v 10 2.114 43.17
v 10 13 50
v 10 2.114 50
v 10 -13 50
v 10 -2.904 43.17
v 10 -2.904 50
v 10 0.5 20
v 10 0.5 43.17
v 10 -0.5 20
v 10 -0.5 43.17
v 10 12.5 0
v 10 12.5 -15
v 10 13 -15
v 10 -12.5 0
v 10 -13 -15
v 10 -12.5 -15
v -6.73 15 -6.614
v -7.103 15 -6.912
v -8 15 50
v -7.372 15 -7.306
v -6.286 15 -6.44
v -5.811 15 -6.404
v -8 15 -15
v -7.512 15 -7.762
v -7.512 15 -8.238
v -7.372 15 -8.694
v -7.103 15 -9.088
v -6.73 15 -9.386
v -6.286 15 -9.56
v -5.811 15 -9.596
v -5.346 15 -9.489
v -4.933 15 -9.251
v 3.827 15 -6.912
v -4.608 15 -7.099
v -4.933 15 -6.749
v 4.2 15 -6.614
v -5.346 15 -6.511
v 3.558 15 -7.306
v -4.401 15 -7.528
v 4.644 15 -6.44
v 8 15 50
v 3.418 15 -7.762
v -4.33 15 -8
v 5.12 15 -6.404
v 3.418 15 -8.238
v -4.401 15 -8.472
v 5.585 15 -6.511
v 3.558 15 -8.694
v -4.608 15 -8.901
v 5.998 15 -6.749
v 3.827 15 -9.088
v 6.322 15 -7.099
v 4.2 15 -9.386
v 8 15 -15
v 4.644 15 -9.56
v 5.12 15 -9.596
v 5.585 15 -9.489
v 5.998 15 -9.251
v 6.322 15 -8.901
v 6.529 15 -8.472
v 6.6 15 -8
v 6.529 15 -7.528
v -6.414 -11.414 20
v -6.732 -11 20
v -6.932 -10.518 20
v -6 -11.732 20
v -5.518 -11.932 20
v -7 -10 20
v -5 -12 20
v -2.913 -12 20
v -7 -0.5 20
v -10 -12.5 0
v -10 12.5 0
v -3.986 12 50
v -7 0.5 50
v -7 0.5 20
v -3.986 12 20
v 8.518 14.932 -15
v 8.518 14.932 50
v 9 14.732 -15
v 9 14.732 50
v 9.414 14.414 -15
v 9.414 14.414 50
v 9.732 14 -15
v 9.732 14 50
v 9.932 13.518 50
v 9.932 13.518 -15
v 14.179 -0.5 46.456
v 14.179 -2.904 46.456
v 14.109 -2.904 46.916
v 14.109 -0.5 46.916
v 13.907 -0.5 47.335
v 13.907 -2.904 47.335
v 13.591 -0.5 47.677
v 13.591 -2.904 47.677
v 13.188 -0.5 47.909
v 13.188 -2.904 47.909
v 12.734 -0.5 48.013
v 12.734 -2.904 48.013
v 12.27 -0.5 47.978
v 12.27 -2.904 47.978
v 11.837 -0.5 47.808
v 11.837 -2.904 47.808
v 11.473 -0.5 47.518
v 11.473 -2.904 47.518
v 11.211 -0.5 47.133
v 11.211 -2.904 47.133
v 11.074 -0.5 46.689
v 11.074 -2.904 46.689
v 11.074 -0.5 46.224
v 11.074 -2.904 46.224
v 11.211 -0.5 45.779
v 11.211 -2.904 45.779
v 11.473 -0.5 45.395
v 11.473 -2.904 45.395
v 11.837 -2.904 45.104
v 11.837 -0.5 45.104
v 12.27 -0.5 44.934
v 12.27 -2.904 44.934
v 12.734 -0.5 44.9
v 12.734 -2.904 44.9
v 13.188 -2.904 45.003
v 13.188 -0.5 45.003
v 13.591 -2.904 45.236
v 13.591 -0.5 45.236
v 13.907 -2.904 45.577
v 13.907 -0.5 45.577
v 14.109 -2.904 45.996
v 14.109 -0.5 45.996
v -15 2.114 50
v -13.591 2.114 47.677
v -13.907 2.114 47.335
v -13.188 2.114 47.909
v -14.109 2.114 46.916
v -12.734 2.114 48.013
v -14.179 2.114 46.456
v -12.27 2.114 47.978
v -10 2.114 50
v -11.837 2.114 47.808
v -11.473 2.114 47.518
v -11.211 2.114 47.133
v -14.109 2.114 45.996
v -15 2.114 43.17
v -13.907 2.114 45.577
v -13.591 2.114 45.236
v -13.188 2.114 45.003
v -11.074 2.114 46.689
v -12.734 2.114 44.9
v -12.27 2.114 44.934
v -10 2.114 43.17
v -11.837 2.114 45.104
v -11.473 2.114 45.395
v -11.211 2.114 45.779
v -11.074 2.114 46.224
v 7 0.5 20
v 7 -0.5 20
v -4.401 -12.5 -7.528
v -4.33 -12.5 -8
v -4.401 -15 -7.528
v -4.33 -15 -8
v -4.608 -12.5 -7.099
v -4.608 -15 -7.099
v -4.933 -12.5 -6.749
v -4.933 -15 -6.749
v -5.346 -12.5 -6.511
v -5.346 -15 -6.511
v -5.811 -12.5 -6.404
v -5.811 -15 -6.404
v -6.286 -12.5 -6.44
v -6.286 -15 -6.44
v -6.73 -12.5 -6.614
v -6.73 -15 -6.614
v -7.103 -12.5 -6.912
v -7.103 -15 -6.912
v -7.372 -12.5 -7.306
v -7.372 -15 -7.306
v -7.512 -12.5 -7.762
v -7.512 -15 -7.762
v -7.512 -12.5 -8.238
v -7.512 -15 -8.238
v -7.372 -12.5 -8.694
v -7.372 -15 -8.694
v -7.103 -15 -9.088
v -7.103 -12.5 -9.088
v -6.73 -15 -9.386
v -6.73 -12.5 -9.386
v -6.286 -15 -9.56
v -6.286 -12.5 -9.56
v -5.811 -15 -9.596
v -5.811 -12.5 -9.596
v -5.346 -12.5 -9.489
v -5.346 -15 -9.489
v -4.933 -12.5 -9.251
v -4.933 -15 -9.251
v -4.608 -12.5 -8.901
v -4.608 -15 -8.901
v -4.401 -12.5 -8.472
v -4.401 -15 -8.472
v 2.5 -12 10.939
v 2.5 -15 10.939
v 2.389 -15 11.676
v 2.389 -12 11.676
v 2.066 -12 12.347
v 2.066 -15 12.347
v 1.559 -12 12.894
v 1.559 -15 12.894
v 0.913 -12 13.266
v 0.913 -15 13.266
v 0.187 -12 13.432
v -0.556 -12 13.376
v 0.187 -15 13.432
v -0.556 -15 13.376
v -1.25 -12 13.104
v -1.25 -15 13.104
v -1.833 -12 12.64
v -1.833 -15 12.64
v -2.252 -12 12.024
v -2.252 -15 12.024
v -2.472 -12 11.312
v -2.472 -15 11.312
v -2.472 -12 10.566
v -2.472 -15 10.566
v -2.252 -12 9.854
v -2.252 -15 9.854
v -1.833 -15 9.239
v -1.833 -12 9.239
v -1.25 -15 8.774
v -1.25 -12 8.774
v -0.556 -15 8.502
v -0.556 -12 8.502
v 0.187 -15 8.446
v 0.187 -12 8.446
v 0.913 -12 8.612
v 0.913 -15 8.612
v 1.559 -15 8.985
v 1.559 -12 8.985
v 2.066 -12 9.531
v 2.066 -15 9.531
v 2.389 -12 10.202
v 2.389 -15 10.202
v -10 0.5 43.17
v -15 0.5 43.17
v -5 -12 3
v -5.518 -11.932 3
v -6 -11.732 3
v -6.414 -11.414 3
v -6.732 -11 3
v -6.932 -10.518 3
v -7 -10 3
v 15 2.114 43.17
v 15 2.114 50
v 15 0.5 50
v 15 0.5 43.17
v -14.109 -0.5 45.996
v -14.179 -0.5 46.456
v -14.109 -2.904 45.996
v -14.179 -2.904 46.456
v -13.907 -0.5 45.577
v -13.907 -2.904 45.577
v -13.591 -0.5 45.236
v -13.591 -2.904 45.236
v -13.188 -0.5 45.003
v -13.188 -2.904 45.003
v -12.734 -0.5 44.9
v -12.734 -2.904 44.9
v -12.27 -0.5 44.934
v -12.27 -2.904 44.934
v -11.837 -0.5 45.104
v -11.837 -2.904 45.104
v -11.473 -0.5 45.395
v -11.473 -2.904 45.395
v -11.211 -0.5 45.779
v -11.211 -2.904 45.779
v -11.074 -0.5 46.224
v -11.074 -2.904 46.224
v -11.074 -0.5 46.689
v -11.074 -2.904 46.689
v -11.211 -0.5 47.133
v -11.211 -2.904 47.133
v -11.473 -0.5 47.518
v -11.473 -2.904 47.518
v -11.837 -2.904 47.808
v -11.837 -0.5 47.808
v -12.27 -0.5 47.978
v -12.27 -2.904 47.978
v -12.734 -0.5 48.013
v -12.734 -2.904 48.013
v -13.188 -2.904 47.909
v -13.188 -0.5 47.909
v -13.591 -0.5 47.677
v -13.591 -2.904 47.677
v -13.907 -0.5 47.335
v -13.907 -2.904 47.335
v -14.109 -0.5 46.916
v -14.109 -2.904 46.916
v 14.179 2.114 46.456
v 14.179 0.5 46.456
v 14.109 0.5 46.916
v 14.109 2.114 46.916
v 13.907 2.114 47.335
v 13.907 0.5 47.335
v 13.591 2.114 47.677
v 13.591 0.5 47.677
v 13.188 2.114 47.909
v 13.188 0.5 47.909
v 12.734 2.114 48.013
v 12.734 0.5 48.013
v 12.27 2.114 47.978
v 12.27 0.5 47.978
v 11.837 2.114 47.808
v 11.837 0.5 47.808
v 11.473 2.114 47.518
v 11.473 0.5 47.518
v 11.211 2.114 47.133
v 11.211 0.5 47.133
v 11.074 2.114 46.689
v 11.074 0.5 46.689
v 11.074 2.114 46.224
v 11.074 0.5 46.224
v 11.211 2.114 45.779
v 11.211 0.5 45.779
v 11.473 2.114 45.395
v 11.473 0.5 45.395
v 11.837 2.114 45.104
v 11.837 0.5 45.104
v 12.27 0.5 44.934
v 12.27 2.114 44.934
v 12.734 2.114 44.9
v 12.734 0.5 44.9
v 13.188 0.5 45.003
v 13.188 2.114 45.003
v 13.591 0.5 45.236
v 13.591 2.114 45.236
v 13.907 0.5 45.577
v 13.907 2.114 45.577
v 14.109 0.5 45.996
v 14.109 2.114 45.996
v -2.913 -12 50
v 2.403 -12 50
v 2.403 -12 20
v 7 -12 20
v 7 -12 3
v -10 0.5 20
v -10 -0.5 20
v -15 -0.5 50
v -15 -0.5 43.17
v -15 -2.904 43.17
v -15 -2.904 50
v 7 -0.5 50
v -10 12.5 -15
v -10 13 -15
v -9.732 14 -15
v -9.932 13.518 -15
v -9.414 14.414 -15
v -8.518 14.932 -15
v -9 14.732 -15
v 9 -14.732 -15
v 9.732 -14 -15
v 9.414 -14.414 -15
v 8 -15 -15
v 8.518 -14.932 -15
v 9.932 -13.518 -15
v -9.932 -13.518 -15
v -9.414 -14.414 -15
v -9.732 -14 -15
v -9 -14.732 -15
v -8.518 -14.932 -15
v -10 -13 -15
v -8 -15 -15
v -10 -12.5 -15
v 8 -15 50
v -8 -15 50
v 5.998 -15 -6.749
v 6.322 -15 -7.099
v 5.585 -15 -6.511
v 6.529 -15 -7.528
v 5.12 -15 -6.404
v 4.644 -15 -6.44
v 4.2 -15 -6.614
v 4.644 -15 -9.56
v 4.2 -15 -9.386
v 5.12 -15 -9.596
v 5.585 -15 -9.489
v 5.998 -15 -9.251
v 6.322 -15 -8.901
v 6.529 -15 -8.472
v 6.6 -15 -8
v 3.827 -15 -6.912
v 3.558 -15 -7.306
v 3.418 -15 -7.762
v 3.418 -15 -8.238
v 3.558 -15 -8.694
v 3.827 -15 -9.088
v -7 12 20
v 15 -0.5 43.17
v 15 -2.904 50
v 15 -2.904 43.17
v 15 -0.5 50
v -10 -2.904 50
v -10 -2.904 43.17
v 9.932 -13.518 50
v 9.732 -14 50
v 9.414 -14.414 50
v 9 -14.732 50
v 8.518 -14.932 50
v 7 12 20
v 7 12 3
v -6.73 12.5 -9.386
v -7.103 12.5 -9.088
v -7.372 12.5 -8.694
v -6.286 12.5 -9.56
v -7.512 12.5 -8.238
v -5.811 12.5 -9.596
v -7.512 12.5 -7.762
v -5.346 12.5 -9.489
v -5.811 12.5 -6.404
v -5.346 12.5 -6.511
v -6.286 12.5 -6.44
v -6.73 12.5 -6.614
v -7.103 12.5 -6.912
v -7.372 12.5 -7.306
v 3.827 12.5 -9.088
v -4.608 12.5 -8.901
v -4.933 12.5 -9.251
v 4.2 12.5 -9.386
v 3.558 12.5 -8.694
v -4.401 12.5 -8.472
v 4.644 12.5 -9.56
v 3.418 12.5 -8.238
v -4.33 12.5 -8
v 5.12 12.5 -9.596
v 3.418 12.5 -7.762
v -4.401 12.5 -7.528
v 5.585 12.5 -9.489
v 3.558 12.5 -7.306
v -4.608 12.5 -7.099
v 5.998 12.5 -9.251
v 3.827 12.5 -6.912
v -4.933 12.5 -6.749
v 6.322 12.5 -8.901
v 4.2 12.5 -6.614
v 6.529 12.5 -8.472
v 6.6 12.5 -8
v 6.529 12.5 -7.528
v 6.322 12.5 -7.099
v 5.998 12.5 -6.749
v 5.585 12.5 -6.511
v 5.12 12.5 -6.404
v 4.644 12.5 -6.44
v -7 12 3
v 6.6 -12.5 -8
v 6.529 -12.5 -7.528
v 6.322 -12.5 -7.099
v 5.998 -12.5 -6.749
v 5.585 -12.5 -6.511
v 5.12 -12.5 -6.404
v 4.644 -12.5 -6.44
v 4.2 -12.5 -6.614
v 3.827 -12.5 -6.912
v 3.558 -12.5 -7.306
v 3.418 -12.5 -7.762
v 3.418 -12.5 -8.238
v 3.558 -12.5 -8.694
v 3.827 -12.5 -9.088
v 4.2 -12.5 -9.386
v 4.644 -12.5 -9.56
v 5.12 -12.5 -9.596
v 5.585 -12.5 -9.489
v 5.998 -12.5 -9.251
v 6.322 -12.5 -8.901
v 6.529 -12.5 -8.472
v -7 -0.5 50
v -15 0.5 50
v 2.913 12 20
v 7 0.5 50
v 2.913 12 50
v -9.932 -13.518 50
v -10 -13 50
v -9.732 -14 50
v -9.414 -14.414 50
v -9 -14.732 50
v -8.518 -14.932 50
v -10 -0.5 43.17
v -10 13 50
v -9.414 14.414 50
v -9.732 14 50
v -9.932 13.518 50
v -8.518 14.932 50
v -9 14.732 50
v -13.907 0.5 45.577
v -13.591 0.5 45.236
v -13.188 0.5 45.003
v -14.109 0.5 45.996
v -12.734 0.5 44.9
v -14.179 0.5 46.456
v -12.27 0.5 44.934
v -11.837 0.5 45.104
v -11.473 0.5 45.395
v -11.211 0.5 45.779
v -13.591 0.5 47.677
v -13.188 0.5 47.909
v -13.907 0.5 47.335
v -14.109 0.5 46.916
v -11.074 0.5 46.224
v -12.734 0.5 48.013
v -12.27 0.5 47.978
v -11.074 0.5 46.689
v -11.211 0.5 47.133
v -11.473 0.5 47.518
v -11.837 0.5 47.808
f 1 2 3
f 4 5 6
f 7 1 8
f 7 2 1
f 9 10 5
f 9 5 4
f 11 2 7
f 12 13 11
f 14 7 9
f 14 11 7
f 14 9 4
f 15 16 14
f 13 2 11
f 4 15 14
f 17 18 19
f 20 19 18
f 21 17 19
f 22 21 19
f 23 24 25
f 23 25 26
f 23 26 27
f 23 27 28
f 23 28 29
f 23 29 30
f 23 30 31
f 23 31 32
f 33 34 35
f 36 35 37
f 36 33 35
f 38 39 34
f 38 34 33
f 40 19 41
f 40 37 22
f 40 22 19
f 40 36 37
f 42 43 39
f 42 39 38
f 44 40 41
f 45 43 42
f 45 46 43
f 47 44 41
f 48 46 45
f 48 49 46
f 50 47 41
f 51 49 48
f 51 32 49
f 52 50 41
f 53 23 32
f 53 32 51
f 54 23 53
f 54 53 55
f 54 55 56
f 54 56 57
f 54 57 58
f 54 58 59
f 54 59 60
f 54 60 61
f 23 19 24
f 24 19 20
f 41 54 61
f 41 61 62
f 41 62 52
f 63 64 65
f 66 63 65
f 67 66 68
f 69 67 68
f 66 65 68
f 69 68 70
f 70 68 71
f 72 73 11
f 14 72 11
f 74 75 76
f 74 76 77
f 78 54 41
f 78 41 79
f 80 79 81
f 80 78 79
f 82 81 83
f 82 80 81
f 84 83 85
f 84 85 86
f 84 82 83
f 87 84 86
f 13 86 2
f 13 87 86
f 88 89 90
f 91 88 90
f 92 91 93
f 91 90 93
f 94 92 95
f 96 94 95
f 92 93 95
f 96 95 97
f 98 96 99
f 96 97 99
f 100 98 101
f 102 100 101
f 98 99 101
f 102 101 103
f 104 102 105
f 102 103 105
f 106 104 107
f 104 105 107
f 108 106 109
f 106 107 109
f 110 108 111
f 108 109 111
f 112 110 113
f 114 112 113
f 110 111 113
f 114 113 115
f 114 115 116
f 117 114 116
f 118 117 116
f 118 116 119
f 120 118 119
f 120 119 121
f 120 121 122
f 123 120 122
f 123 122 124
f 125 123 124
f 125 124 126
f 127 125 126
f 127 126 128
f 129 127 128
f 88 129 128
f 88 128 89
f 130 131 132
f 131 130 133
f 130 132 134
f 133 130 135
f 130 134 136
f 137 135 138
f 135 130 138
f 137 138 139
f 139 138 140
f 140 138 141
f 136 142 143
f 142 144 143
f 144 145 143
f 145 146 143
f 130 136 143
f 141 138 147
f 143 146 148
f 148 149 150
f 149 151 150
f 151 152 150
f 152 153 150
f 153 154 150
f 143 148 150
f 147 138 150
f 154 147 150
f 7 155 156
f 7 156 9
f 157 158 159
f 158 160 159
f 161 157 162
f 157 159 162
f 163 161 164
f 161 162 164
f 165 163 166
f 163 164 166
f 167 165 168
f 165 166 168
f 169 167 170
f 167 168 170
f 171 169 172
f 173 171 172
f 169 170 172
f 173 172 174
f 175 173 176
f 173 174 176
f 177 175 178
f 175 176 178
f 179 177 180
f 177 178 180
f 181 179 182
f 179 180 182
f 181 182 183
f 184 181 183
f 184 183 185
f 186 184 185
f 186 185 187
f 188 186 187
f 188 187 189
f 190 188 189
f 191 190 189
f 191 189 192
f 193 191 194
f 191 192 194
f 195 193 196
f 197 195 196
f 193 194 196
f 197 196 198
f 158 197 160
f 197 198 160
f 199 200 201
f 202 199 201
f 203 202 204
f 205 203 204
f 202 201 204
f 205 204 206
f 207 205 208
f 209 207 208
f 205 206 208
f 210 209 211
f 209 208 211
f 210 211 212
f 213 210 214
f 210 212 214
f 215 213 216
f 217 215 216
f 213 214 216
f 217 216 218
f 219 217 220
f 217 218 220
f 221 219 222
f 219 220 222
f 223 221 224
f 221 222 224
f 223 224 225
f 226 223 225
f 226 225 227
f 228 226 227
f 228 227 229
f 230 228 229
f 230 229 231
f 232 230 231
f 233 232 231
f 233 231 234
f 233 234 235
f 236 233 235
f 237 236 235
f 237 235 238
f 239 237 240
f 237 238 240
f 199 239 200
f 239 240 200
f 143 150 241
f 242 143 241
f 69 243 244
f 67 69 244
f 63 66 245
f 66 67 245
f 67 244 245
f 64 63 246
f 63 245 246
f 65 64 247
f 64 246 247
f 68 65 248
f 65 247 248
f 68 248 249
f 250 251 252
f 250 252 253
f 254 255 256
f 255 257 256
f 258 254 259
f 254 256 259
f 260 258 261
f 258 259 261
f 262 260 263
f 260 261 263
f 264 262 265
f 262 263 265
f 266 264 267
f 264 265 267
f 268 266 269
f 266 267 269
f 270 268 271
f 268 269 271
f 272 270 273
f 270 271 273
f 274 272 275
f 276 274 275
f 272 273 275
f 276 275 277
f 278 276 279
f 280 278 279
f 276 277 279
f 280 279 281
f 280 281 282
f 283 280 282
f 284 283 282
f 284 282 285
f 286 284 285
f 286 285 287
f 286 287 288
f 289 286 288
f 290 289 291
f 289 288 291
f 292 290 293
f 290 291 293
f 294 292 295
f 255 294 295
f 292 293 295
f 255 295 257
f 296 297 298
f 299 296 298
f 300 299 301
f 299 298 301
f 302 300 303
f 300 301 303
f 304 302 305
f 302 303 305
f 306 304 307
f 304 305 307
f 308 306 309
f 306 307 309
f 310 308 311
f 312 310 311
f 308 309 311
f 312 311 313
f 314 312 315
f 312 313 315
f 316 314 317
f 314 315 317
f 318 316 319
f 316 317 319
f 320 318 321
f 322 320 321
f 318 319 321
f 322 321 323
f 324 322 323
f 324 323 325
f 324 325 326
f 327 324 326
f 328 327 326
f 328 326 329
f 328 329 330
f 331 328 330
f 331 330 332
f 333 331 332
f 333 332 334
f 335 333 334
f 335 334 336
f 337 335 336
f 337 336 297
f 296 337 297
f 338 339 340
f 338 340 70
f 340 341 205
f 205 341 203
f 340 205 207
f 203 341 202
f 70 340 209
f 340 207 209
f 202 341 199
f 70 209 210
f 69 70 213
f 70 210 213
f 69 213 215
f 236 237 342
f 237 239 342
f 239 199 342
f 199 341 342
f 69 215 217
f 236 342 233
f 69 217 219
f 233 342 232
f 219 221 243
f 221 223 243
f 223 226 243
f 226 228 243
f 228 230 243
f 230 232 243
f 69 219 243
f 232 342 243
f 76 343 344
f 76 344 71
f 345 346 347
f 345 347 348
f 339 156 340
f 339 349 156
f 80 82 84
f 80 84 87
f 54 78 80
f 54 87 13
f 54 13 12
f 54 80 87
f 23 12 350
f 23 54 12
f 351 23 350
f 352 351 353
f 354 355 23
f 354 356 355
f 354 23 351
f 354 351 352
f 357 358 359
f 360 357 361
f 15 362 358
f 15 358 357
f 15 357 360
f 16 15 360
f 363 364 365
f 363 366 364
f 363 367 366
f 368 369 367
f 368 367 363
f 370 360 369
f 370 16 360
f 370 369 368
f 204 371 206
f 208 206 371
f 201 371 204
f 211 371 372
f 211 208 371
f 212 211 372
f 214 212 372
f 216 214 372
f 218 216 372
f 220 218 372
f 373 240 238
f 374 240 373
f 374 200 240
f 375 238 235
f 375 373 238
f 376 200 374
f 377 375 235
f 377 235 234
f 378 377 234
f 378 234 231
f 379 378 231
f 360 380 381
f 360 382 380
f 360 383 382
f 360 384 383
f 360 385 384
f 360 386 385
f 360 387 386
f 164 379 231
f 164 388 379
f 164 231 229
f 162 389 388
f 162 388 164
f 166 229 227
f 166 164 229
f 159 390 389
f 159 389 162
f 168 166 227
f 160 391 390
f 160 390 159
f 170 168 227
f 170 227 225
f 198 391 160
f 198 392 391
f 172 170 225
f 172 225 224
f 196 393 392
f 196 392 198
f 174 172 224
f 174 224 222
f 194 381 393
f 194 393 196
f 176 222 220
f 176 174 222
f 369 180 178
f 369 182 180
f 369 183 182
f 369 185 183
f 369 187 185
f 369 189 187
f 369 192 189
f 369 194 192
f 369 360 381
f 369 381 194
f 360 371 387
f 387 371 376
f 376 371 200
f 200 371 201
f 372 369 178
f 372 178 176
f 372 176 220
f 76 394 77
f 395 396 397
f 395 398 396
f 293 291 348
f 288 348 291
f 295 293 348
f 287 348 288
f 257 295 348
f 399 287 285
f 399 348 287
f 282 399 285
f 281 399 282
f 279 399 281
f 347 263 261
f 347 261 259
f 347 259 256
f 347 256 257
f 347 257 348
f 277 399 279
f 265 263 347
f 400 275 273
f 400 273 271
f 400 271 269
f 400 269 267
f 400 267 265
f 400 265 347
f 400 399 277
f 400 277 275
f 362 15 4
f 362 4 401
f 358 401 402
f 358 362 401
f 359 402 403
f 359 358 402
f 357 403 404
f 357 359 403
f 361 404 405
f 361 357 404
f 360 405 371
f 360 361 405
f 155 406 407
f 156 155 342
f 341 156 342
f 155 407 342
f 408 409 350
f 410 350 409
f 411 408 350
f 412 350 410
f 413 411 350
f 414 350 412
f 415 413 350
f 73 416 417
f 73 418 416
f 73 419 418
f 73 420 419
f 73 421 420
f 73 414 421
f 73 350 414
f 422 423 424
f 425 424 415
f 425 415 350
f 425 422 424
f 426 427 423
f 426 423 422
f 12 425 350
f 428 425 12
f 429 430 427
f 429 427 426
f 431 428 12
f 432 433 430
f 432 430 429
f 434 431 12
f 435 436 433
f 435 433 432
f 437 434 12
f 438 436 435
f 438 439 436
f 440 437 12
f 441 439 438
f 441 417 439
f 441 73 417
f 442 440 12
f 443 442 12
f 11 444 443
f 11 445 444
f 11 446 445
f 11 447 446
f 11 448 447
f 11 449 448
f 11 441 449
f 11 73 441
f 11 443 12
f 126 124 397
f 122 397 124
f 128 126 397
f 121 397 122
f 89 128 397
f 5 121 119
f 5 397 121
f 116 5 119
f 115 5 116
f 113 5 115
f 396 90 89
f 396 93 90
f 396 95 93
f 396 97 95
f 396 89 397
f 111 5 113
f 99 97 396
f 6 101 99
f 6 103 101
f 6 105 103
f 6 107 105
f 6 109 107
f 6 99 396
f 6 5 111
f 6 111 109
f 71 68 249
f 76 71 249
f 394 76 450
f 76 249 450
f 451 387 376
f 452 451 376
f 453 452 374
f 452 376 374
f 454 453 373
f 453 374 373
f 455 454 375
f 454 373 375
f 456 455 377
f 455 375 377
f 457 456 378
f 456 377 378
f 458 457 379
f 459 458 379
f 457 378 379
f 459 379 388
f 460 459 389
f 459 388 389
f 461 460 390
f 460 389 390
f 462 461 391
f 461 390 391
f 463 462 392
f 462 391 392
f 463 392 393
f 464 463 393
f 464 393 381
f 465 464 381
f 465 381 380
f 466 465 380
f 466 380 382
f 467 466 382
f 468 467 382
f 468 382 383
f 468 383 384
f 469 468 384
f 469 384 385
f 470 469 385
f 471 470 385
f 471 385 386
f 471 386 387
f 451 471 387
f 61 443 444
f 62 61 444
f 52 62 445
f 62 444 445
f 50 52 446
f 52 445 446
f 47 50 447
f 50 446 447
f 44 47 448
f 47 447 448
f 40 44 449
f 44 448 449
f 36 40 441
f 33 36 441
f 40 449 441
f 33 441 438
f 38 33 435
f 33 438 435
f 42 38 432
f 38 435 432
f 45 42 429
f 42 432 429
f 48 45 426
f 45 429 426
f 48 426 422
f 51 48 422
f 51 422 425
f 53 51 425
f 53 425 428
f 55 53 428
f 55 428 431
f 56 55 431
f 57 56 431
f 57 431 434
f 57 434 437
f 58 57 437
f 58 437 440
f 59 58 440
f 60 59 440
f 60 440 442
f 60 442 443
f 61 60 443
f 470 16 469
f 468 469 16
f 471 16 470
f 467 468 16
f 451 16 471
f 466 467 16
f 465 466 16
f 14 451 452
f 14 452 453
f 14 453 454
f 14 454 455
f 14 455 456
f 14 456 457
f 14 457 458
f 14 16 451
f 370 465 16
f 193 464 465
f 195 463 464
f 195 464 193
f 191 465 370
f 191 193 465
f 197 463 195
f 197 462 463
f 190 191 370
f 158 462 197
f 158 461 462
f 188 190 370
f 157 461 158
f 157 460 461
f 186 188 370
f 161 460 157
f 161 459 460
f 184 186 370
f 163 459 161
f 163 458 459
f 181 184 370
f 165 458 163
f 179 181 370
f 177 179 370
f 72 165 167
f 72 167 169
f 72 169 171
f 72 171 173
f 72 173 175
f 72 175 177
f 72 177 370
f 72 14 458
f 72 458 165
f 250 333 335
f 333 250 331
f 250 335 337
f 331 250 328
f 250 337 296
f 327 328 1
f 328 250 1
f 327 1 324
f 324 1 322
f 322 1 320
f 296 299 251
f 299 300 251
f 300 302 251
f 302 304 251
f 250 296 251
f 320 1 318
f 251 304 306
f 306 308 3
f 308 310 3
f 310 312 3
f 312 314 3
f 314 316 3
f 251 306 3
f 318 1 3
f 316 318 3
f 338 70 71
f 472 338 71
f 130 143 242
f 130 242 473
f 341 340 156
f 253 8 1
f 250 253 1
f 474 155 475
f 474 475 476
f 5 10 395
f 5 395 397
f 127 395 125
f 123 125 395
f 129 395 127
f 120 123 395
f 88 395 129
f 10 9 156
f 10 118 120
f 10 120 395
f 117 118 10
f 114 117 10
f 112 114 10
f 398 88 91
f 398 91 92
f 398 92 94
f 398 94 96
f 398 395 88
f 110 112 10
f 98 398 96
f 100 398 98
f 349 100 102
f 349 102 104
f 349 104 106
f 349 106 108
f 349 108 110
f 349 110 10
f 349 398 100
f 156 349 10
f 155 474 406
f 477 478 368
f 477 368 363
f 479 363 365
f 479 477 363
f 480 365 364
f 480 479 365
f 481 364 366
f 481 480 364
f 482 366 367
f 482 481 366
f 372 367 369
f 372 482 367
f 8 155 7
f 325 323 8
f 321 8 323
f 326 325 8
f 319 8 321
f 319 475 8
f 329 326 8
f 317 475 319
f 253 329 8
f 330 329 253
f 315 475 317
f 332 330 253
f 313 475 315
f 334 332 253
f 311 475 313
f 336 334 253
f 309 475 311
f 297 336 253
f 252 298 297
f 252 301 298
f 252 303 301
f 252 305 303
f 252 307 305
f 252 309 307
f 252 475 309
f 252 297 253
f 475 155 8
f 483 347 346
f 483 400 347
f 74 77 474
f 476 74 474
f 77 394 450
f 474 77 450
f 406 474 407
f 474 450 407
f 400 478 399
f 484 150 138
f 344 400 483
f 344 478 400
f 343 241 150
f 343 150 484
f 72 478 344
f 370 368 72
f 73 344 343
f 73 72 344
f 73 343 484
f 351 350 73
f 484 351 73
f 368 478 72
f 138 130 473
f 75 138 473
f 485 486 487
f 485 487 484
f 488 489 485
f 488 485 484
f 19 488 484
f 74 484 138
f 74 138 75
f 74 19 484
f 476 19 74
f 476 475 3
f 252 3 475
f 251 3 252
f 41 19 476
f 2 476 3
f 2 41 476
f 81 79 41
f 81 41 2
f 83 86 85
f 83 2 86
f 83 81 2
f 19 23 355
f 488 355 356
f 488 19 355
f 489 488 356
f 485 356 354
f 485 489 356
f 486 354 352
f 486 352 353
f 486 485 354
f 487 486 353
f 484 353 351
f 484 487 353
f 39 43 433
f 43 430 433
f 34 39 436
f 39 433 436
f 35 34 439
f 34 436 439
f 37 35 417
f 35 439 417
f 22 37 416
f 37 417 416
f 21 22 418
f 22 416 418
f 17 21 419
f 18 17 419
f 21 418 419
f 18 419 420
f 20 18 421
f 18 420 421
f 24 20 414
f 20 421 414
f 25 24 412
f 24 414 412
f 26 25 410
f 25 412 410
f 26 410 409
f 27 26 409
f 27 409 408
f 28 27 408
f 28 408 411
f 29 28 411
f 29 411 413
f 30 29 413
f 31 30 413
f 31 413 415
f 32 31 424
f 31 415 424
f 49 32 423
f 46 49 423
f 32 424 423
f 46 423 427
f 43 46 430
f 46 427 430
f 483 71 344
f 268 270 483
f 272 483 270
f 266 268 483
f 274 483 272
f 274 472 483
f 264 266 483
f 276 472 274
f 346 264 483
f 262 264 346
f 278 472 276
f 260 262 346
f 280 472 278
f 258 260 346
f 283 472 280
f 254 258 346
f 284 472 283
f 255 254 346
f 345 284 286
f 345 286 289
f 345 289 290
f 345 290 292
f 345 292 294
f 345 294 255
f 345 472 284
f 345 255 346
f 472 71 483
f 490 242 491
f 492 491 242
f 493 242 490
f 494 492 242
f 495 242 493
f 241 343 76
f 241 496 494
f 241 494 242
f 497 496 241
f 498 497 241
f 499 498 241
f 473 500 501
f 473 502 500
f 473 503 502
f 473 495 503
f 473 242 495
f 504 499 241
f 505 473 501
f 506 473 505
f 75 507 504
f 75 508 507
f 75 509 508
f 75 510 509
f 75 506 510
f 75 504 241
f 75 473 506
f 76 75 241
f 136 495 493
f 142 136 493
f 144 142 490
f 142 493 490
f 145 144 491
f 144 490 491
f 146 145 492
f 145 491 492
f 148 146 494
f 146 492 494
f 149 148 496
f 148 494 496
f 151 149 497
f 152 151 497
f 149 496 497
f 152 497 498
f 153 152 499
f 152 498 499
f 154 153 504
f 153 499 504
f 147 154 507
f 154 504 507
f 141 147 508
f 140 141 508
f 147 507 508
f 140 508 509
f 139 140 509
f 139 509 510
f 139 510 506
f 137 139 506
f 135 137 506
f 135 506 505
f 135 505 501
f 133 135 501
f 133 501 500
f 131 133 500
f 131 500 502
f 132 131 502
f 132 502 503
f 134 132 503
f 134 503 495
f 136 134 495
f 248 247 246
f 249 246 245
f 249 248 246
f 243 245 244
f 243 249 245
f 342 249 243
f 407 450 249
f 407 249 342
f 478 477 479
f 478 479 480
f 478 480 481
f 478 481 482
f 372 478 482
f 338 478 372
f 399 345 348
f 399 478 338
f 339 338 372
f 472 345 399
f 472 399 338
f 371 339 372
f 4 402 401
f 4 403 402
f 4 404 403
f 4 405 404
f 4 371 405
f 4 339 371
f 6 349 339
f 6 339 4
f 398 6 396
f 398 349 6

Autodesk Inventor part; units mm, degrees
ref_plane "YZ Plane" through (0, 0, 0) normal (1, 0, 0) x (0, 1, 0)
ref_plane "XZ Plane" through (0, 0, 0) normal (0, 1, 0) x (-1, 0, 0)
ref_plane "XY Plane" through (0, 0, 0) normal (0, 0, 1) x (1, 0, 0)
sketch "Sketch1" plane through (0, 0, 0) normal (0, 0, 1) x (1, 0, 0)
  line L0 (-10, 15) -> (10, 15)
  line L1 (10, 15) -> (10, -15)
  line L2 (10, -15) -> (-10, -15)
  line L3 (-10, -15) -> (-10, 15)
  line L4 (-10, 15) -> (10, -15) construction
  line L5 (10, 15) -> (-10, -15) construction
  point P0 (0, 0)
  dimension "d0" = 20
  dimension "d1" = 30
extrude "Extrusion1" add sketch "Sketch1" along normal blind 50
shell "Shell1" thickness 3 removed faces 1 at (-3.3333, 5, 50)
sketch "Sketch2" plane through (-10, 15, 0) normal (0, 1, 0) x (1, 0, 0)
  line L0 (3, -3) -> (17, -3) projected
  line L1 (-7, -47) -> (17, -47)
  line L2 (17, -47) -> (17, -3)
  line L3 (17, -3) -> (-7, -3)
  line L4 (-7, -3) -> (-7, -47)
  line L5 (-7, -47) -> (17, -3) construction
  line L6 (17, -47) -> (-7, -3) construction
  point P0 (10, 0)
  point P1 (5, -25)
sketch "Sketch3" plane through (0, 0, 0) normal (0, 0, -1) x (-1, 0, 0)
  line L0 (-10, 15) -> (10, 15) projected
  line L1 (10, 15) -> (10, -15) projected
  line L2 (-10, 15) -> (10, 15)
  line L3 (10, 15) -> (10, 12.5)
  line L4 (10, 12.5) -> (-10, 12.5)
  line L5 (-10, 12.5) -> (-10, 15)
  line L6 (-10, -15) -> (-10, 15) projected
  line L7 (10, -15) -> (-10, -15)
  line L8 (-10, -15) -> (-10, -12.5)
  line L9 (-10, -12.5) -> (10, -12.5)
  line L10 (10, -12.5) -> (10, -15)
  point P0 (0, 0)
  point P1 (10, -12.5)
  dimension "d5" = 2.5
  dimension "d6" = 2.5
extrude "Extrusion2" add sketch "Sketch3" along normal blind 15 contours L0 L1 L4 L5 | L9 L1 L7 L6
sketch "Sketch4" plane through (-10, 15, 50) normal (0, 1, 0) x (1, 0, 0)
  point P0 (10, 50)
sketch "Sketch6" plane through (-10, -15, 50) normal (0, -1, 0) x (1, 0, 0)
  circle A0 centre (4.0698, -58) radius 1.6 projected
  circle A1 centre (15, -58) radius 1.6 projected
  point P0 (10, -50)
extrude "Extrusion4" cut sketch "Sketch6" against normal through all
fillet "Fillet1" radius 2 4 edges at (-7, -12, 26.5) (10, -15, 17.5) (-10, 15, 17.5) (10, 15, 17.5)
fillet "Fillet2" radius 2 1 edges at (-10, -15, 17.5)
sketch "Sketch7" plane through (8, -15, -15) normal (0, -1, 0) x (1, 0, 0)
  circle A0 centre (-8, 25.9391) radius 2.5
  point P0 (-8, 15)
  dimension "d17" = 5
extrude "Extrusion5" cut sketch "Sketch7" against normal blind 10
sketch "Sketch8" plane through (0, 0, 50) normal (0, 0, 1) x (1, 0, 0)
  line L0 (-10, 12.5) -> (-10, -12.5) projected
  line L1 (10, -0.5) -> (-10, -0.5)
  line L2 (-10, -0.5) -> (-10, 0.5)
  line L3 (-10, 0.5) -> (10, 0.5)
  line L4 (10, 0.5) -> (10, -0.5)
  line L5 (10, -0.5) -> (-10, 0.5) construction
  line L6 (-10, -0.5) -> (10, 0.5) construction
  point P0 (0, 0)
  dimension "d20" = 1
extrude "Extrusion6" cut sketch "Sketch8" against normal blind 30
sketch "Sketch9" plane through (0, 0, 50) normal (0, 0, 1) x (1, 0, 0)
  line L0 (-7, 0.5) -> (-3.9859, 12)
  line L1 (-7, 12) -> (7, 12) projected
  line L2 (-3.9859, 12) -> (2.913, 12)
  line L3 (7, 0.5) -> (2.913, 12)
  line L4 (7, -0.5) -> (2.3967, -12.0157)
  line L5 (2.3967, -12.0157) -> (-2.9074, -12.0157)
  line L6 (7, -12) -> (7, 12) projected
  line L7 (-7, -10) -> (-7, -0.5) projected
  line L8 (-2.9074, -12.0157) -> (-7, -0.5)
  line L9 (-7, -0.5) -> (7, -0.5)
  line L10 (10, -12.5) -> (10, 12.5) projected
  line L11 (7, 0.5) -> (-7, 0.5)
  line L12 (10, 12.5) -> (-10, 12.5) projected
  line L13 (7, -12) -> (-5, -12) projected
  arc A0 (-7, -10) -> (-5, -12) centre (-5, -10) ccw projected
  line L14 (-7, 0.5) -> (-7, 12) projected
  point P0 (0, 0)
  point P1 (2.403, -12)
  point P2 (-2.913, -12)
extrude "Extrusion7" add sketch "Sketch9" against normal blind 30 contours L14 L1 L0 | L3 L1 L6 | L6 L13 L4 | L8 L13 A0 L7
sketch "Sketch10" plane through (10, -12.5, 0) normal (1, 0, 0) x (0, 0, -1)
  line L0 (-20, 12) -> (-50, 12) projected
  line L1 (-50, 12) -> (-43.1699, 12)
  line L2 (-43.1699, 12) -> (-43.1699, 9.596)
  line L3 (-43.1699, 9.596) -> (-50, 9.596)
  line L4 (-50, 9.596) -> (-50, 12)
  line L5 (-50, 13) -> (-43.1699, 13)
  line L6 (-43.1699, 13) -> (-43.1699, 14.6143)
  line L7 (-43.1699, 14.6143) -> (-50, 14.6143)
  line L8 (-50, 14.6143) -> (-50, 13)
  point P0 (0, 12.5)
extrude "Extrusion8" add sketch "Sketch10" along normal blind 5
sketch "Sketch11" plane through (10, -2.904, 43.1699) normal (0, -1, 0) x (1, 0, 0)
  circle A0 centre (2.6177, 3.2863) radius 1.5609
  point P0 (-10, -43.1699)
extrude "Extrusion9" cut sketch "Sketch11" against normal blind 6.25
mirror "Mirror1" about plane through (0, 0, 0) normal (1, 0, 0) of "Extrusion8", "Extrusion9"
properties part number "SUCTION_EXTENSION1" material "Iron, Gray"
